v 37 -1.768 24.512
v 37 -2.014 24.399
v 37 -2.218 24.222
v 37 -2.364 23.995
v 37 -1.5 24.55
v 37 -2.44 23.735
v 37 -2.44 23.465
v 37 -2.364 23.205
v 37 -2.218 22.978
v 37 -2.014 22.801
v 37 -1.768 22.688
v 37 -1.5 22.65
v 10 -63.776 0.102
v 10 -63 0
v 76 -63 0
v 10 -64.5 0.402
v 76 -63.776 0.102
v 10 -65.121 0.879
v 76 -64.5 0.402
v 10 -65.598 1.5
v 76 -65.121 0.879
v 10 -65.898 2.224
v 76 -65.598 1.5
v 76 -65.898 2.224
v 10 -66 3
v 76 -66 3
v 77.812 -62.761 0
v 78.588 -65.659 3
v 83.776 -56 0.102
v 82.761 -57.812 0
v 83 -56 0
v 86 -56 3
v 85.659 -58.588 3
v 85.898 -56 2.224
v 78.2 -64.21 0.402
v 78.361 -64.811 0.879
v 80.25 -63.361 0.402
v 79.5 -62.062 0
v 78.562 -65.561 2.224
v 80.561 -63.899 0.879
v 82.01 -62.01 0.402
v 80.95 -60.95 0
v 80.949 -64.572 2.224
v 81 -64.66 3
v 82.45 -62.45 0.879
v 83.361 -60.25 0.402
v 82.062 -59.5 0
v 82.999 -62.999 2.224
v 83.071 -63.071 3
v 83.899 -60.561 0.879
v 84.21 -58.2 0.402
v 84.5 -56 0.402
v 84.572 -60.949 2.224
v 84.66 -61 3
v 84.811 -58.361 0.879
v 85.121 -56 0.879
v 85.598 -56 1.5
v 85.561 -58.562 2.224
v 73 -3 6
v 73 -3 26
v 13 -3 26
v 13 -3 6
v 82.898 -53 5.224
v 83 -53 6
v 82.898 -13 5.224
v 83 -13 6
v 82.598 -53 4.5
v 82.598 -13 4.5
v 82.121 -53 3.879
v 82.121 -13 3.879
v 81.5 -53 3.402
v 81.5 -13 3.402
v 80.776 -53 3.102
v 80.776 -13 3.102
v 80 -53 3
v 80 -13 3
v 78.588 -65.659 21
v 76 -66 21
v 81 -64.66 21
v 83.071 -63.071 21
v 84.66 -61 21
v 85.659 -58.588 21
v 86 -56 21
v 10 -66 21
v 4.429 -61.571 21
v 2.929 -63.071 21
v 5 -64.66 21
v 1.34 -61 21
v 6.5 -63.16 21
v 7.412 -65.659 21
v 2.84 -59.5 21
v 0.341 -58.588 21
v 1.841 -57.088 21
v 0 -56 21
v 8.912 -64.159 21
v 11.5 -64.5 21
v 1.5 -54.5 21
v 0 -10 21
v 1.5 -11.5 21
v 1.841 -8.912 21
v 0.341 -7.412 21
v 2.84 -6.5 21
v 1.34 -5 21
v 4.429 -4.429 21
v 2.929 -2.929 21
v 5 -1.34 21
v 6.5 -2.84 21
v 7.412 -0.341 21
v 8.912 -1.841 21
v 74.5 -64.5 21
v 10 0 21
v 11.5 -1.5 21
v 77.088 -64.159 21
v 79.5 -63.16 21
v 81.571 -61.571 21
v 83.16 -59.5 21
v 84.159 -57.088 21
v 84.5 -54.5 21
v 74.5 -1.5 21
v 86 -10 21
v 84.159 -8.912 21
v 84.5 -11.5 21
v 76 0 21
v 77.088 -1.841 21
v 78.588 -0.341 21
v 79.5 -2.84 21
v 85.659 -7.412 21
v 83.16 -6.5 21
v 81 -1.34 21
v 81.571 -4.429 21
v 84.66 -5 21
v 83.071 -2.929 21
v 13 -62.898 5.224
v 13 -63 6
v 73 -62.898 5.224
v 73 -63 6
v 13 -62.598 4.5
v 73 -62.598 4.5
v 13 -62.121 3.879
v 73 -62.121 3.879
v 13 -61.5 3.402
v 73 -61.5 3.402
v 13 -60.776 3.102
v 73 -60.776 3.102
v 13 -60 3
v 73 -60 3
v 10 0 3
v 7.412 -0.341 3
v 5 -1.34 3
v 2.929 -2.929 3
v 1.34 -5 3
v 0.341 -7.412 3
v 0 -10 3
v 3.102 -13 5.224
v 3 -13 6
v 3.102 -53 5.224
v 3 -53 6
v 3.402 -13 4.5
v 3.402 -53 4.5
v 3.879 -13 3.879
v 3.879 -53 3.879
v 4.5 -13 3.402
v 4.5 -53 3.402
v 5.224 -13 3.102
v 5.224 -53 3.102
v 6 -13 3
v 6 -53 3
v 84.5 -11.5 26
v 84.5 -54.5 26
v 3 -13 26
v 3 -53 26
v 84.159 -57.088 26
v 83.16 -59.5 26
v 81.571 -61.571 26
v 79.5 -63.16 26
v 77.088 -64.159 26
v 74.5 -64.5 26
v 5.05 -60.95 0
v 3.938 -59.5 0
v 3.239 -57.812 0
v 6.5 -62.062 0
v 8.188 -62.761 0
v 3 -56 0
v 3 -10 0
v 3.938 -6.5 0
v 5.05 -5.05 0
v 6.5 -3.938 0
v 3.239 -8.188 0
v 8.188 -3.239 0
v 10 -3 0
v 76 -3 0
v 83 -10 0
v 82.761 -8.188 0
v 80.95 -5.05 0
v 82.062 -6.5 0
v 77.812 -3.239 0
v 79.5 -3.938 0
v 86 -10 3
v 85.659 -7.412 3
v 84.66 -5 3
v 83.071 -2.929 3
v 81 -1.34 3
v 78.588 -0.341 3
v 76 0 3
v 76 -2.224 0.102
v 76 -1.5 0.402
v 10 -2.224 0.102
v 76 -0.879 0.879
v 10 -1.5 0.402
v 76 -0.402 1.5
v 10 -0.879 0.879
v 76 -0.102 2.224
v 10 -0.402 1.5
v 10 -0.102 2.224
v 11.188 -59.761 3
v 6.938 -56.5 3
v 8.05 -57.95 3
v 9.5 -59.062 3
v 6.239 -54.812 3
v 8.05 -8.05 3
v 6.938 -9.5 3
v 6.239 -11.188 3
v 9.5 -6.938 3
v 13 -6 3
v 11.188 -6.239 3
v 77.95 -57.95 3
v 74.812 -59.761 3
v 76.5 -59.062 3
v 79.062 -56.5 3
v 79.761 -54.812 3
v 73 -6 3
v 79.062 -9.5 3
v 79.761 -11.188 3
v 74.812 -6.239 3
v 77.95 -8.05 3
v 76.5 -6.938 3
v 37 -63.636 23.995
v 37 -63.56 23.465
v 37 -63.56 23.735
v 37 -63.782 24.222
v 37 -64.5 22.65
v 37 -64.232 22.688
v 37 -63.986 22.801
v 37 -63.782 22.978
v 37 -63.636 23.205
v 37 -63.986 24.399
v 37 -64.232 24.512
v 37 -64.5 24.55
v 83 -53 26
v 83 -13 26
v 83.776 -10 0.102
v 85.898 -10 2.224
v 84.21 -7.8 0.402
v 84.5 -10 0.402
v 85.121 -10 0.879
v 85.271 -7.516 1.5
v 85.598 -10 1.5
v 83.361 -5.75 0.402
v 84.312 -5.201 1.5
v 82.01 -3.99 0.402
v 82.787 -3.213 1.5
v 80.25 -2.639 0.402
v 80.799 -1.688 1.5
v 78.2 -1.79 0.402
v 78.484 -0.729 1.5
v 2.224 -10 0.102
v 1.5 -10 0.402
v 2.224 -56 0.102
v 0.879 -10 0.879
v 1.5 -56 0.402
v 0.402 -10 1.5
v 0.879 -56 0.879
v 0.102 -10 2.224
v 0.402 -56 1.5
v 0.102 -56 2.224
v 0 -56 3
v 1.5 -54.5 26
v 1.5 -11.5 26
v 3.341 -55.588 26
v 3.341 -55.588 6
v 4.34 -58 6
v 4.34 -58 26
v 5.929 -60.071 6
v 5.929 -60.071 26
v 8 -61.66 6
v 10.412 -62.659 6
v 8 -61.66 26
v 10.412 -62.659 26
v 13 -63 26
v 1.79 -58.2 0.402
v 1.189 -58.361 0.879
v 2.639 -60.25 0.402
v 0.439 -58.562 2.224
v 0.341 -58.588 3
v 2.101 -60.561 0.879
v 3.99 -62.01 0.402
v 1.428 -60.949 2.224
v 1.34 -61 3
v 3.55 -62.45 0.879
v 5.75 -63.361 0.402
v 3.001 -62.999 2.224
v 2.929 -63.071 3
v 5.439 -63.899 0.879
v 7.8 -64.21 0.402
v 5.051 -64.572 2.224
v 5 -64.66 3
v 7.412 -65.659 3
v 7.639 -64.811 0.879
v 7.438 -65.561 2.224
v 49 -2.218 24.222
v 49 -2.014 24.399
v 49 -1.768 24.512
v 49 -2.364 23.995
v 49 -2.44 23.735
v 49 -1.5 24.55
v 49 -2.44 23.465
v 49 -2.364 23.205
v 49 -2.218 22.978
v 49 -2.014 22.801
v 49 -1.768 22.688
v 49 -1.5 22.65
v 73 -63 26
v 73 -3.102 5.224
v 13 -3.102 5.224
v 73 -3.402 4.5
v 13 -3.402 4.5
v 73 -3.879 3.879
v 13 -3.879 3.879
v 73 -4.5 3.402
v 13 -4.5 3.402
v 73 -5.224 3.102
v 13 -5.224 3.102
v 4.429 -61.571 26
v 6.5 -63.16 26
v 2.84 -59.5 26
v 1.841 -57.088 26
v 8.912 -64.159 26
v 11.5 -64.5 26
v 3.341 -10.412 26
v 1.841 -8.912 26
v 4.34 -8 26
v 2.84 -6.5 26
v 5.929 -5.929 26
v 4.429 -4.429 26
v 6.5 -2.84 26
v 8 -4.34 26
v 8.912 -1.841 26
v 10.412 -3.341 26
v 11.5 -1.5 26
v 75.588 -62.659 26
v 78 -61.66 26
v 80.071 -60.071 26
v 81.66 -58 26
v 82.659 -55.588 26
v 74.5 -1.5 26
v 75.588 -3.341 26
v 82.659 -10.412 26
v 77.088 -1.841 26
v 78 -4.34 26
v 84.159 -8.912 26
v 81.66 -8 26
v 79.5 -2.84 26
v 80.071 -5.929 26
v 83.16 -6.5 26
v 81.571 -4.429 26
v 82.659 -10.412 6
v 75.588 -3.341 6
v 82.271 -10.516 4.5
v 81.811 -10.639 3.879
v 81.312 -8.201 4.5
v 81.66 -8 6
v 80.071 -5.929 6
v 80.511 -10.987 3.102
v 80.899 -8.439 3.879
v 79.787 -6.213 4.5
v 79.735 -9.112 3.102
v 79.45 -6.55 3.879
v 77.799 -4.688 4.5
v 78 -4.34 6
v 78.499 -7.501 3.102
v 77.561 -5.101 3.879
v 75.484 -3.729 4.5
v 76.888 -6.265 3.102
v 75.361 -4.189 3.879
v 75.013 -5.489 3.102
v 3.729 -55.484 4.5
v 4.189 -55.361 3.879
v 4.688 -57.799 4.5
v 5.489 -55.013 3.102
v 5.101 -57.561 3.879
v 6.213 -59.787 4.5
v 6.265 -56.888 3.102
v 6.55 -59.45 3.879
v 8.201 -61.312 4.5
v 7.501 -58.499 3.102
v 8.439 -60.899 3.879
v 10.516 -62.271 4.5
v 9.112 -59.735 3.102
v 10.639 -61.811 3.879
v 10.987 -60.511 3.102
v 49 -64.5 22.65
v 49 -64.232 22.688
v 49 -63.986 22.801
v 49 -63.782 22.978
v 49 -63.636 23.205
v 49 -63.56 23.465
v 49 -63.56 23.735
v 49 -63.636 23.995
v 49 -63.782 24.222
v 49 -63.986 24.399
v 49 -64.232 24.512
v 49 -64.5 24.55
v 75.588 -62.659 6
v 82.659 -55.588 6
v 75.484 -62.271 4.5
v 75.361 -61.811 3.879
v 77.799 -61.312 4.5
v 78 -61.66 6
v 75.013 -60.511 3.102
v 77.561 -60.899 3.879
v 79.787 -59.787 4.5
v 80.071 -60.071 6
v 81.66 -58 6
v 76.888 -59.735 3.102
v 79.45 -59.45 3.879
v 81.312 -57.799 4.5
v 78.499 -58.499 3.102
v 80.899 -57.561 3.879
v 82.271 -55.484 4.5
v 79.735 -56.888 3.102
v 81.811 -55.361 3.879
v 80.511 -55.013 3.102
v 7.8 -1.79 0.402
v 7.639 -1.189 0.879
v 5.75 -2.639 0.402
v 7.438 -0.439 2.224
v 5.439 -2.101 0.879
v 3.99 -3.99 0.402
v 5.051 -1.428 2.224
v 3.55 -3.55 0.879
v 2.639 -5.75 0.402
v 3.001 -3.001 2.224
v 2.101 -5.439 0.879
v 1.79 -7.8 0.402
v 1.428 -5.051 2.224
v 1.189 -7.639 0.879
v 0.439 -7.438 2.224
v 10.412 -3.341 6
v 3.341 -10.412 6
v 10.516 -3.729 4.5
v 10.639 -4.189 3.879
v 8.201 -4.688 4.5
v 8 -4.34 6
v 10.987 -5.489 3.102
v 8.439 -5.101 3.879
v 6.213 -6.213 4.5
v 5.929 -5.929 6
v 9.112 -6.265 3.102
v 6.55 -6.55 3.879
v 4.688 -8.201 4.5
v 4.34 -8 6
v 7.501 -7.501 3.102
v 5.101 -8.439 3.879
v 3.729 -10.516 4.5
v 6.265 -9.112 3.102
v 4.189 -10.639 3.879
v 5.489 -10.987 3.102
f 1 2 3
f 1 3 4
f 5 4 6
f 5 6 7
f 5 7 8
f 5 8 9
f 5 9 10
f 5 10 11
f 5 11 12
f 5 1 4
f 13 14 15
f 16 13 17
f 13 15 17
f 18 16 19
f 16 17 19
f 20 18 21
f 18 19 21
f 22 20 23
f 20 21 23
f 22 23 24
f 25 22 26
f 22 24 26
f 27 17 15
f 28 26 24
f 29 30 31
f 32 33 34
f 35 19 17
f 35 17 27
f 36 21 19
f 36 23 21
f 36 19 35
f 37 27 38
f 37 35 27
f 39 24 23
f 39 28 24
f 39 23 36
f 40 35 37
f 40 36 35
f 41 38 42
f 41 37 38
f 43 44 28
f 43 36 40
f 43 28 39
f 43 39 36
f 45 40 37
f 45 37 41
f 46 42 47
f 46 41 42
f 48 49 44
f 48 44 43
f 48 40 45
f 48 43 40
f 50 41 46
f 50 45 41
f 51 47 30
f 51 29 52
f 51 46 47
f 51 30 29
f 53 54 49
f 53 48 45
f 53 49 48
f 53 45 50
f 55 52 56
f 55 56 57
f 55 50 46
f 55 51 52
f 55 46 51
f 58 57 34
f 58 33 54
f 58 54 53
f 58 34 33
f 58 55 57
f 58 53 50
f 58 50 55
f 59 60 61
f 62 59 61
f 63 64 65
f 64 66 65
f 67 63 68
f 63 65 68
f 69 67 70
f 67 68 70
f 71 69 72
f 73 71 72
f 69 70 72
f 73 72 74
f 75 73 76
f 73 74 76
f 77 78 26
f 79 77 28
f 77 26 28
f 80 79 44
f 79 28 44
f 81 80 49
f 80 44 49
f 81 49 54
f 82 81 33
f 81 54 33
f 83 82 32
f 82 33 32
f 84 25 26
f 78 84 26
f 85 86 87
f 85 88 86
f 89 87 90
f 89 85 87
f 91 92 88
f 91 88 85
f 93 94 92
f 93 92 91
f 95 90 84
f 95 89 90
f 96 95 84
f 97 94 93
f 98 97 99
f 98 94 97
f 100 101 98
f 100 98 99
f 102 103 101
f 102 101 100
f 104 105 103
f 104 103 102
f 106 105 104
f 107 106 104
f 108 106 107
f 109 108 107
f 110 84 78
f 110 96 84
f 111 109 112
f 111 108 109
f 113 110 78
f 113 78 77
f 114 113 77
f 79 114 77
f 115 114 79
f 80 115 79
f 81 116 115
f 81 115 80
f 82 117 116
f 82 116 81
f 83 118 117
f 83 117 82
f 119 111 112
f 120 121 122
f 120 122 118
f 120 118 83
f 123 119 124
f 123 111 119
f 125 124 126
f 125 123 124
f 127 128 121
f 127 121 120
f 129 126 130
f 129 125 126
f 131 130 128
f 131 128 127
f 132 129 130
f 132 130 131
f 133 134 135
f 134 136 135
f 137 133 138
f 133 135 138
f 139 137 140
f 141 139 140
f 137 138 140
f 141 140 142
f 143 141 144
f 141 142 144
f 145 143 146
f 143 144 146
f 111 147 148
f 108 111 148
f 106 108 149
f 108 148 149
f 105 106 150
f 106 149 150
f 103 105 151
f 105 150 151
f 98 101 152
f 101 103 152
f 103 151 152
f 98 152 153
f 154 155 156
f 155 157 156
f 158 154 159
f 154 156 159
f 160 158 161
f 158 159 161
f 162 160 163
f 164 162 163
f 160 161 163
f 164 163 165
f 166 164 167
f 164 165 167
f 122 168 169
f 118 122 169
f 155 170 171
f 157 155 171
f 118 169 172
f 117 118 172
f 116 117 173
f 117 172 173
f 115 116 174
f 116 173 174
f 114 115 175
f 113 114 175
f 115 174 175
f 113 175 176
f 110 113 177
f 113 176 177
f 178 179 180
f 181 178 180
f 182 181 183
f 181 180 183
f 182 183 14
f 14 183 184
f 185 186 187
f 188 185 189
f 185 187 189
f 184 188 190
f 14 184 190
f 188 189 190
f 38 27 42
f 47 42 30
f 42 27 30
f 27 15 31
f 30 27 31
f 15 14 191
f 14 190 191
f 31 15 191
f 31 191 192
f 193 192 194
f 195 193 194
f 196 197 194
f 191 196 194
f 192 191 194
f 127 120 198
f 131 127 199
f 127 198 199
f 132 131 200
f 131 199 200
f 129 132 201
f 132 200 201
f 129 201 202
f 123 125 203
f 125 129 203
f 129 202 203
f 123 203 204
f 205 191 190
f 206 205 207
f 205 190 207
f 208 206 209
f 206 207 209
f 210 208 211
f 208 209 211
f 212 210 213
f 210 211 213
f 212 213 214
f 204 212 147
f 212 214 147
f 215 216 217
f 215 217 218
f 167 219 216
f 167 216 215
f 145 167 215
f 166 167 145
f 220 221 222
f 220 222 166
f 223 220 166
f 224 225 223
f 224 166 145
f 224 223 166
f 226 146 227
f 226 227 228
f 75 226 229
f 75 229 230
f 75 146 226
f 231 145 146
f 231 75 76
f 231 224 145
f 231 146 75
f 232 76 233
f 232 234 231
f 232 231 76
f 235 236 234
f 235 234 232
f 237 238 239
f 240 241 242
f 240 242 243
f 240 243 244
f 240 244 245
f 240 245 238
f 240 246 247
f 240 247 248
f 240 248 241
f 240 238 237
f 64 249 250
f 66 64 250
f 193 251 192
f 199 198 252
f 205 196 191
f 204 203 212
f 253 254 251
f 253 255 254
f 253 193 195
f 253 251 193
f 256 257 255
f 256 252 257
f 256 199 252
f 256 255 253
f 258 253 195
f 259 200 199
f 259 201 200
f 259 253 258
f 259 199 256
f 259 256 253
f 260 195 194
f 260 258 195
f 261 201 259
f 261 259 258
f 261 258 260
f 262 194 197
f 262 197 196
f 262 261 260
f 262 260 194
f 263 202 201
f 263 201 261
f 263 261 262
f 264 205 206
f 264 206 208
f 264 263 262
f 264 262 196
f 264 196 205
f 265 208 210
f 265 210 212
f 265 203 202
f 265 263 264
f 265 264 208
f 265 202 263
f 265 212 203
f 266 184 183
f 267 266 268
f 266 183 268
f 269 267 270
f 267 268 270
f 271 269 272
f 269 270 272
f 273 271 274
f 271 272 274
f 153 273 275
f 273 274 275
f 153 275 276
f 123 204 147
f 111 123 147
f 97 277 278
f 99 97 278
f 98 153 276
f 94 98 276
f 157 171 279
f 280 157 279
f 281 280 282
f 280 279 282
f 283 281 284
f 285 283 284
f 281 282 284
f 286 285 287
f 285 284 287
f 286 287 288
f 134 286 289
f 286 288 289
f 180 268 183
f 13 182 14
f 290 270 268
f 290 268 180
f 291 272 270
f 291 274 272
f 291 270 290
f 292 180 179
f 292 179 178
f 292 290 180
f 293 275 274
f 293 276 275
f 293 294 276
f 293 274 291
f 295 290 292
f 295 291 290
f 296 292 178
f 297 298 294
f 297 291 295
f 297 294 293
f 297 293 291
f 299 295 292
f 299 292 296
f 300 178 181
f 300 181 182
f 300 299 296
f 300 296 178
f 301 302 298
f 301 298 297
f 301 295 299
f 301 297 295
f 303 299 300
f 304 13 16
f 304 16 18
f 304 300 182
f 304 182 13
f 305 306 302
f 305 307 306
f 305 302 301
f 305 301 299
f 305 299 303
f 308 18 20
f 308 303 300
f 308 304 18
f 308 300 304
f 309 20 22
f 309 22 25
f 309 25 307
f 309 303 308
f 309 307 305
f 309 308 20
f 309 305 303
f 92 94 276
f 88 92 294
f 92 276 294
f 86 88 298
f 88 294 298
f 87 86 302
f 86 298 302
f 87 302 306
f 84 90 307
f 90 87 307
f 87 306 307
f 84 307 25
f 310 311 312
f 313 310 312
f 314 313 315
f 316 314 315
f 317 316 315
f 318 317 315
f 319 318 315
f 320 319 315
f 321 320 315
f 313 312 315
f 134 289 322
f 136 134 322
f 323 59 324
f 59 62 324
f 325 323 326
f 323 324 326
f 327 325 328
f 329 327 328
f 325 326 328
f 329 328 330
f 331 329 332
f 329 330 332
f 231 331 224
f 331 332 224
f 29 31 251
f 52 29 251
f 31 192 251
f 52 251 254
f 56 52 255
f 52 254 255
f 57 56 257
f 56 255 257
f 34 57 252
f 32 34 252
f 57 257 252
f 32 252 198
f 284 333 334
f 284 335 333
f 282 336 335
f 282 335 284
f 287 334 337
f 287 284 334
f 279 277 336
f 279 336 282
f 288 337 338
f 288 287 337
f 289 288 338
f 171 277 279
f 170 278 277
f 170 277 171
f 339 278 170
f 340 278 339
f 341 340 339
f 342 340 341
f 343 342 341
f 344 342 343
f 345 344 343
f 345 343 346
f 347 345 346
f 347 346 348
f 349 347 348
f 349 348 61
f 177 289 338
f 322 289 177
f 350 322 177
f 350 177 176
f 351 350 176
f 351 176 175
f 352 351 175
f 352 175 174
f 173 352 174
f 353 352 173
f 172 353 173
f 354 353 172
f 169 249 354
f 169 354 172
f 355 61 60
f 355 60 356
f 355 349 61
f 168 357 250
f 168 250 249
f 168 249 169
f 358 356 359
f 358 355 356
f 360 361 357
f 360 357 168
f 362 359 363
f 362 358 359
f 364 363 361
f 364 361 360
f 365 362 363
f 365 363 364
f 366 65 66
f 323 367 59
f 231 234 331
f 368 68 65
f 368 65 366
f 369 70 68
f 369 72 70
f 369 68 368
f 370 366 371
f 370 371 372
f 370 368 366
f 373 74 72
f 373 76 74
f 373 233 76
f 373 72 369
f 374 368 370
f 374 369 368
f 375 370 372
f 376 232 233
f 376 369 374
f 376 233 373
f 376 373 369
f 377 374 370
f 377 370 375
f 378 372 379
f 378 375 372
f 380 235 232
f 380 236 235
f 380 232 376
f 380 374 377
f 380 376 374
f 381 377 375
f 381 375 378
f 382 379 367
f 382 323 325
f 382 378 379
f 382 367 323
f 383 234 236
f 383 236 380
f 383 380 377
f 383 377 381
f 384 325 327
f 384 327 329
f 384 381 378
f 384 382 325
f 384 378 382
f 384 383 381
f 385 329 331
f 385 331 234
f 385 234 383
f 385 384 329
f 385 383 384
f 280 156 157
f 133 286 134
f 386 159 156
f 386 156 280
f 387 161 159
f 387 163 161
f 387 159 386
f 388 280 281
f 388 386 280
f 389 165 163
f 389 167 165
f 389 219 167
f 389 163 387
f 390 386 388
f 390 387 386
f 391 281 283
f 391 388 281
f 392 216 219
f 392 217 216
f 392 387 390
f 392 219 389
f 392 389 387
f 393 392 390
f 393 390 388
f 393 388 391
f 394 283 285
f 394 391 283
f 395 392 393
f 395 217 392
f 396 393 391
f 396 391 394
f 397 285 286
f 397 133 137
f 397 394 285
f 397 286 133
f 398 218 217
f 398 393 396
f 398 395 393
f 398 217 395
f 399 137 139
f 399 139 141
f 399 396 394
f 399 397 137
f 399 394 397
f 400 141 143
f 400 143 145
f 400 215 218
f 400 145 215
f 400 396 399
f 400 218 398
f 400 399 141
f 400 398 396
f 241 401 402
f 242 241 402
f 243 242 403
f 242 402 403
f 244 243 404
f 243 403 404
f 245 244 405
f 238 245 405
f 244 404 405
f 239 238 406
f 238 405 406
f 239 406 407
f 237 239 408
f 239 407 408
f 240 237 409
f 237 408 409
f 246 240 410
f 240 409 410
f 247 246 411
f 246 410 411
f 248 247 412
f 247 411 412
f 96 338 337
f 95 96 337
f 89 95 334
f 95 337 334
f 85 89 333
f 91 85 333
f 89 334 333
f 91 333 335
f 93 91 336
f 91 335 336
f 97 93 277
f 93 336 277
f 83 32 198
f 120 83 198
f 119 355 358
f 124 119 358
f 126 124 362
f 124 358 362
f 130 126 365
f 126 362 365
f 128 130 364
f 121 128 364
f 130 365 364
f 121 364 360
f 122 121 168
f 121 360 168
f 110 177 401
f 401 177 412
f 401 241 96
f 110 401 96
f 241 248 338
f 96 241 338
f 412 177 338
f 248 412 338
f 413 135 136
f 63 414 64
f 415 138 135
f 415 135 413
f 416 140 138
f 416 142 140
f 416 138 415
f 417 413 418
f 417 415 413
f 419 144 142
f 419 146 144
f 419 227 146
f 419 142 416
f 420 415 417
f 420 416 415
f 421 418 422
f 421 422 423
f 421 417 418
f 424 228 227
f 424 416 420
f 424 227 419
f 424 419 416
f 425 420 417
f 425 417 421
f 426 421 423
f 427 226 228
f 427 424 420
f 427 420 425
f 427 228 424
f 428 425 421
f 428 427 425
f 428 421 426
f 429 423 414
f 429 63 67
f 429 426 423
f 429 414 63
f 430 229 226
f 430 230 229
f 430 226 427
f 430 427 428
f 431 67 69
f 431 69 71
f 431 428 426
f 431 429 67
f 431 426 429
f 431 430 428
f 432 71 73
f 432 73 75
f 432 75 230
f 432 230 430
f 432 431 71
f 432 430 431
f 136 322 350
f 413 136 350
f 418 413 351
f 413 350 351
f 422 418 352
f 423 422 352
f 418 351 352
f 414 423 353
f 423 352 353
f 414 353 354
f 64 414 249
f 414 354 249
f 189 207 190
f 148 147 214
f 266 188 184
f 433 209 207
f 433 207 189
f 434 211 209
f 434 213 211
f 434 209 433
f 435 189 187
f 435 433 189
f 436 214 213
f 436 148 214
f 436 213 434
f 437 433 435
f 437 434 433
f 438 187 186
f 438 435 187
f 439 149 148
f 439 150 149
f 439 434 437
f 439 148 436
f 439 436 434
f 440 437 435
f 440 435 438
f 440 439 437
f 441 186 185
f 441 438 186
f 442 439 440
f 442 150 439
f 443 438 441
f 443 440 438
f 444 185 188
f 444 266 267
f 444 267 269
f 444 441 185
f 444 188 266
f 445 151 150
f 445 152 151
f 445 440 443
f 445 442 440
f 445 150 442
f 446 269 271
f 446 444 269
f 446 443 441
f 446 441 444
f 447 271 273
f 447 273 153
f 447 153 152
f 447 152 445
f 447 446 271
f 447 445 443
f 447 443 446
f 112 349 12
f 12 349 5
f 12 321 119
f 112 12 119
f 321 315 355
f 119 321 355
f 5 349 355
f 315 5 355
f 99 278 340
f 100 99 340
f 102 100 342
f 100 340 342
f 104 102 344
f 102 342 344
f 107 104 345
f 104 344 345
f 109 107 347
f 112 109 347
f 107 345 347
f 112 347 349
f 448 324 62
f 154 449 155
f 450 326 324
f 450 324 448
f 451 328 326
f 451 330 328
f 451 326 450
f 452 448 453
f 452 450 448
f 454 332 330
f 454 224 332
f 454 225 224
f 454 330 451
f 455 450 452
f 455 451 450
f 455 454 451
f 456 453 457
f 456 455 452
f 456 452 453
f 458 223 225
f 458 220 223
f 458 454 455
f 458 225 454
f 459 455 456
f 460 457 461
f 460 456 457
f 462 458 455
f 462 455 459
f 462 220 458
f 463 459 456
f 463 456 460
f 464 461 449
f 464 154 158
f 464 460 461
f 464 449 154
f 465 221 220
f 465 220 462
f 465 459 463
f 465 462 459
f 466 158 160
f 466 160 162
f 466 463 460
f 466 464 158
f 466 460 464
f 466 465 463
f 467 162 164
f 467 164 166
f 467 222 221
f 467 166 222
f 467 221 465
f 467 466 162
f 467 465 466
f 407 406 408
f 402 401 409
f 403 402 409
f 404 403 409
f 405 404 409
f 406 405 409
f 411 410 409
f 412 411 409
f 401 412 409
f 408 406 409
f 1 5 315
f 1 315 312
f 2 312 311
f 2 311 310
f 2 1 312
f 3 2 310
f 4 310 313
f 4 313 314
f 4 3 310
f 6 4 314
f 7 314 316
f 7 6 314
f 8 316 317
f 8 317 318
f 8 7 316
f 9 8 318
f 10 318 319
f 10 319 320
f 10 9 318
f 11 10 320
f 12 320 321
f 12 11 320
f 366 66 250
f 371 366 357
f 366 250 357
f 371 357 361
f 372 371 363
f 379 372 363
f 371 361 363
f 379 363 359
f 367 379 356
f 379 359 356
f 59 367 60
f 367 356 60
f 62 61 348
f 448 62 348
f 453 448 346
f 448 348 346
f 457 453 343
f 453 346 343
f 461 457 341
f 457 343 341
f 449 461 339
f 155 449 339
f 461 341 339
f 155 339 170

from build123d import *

# Parameters (mm, degrees)
F1_DEPTH  = 26
F3_DEPTH  = 23
F4_W      = 86
F4_H      = 66
F5_DEPTH  = 5
F6_R      = 3
F7_R      = 3
F9_R      = 0.95
F10_DEPTH = 6


with BuildPart() as f1:
    # F0 (on Top) → F1 (new body)
    with BuildSketch(Plane.XY):
        with BuildLine():
            Line((76, 0), (10, 0))
            ThreePointArc((10, 0), (2.928932, -2.928932), (0, -10))
            Line((0, -10), (0, -56))
            ThreePointArc((0, -56), (2.928932, -63.071068), (10, -66))
            Line((10, -66), (76, -66))
            ThreePointArc((76, -66), (83.071068, -63.071068), (86, -56))
            Line((86, -56), (86, -10))
            ThreePointArc((86, -10), (83.071068, -2.928932), (76, 0))
        make_face()
    extrude(amount=F1_DEPTH)

    # F2 (on face) → F3 (cut)
    with BuildSketch(Plane.XY.offset(26)):
        with BuildLine():
            Line((73, -3), (13, -3))
            ThreePointArc((13, -3), (5.928932, -5.928932), (3, -13))
            Line((3, -13), (3, -53))
            ThreePointArc((3, -53), (5.928932, -60.071068), (13, -63))
            Line((13, -63), (73, -63))
            ThreePointArc((73, -63), (80.071068, -60.071068), (83, -53))
            Line((83, -53), (83, -13))
            ThreePointArc((83, -13), (80.071068, -5.928932), (73, -3))
        make_face()
    extrude(amount=-F3_DEPTH, mode=Mode.SUBTRACT)

    # F4 (on face) → F5 (cut)
    with BuildSketch(Plane.XY.offset(26)):
        with Locations((43, -33)):
            Rectangle(F4_W, F4_H)
        with BuildLine():
            ThreePointArc((1.5, -11.5), (4.428932, -4.428932), (11.5, -1.5))
            Line((11.5, -1.5), (74.5, -1.5))
            ThreePointArc((74.5, -1.5), (81.571068, -4.428932), (84.5, -11.5))
            Line((84.5, -11.5), (84.5, -54.5))
            ThreePointArc((84.5, -54.5), (81.571068, -61.571068), (74.5, -64.5))
            Line((74.5, -64.5), (11.5, -64.5))
            ThreePointArc((11.5, -64.5), (4.428932, -61.571068), (1.5, -54.5))
            Line((1.5, -54.5), (1.5, -11.5))
        make_face(mode=Mode.SUBTRACT)
    extrude(amount=-F5_DEPTH, mode=Mode.SUBTRACT)

    # F6
    f6_edges = [f1.edges().sort_by_distance(p)[0] for p in [
        (83.071068, -2.928932, 0),
        (43, 0, 0),
        (2.928932, -2.928932, 0),
        (0, -33, 0),
        (2.928932, -63.071068, 0),
        (43, -66, 0),
        (83.071068, -63.071068, 0),
        (86, -33, 0),
    ]]
    fillet(f6_edges, radius=F6_R)

    # F7
    f7_edges = [f1.edges().sort_by_distance(p)[0] for p in [
        (43, -3, 3),
        (5.928932, -5.928932, 3),
        (3, -33, 3),
        (5.928932, -60.071068, 3),
        (43, -63, 3),
        (80.071068, -60.071068, 3),
        (83, -33, 3),
        (80.071068, -5.928932, 3),
    ]]
    fillet(f7_edges, radius=F7_R)

    # F9 (on offset) → F10 (cut, symmetric)
    with BuildSketch(Plane.YZ.offset(43)):
        with Locations((-1.5, 23.6)):
            Circle(F9_R)
        with Locations((-64.5, 23.6)):
            Circle(F9_R)
    extrude(amount=F10_DEPTH, both=True, mode=Mode.SUBTRACT)


solid = f1.part
